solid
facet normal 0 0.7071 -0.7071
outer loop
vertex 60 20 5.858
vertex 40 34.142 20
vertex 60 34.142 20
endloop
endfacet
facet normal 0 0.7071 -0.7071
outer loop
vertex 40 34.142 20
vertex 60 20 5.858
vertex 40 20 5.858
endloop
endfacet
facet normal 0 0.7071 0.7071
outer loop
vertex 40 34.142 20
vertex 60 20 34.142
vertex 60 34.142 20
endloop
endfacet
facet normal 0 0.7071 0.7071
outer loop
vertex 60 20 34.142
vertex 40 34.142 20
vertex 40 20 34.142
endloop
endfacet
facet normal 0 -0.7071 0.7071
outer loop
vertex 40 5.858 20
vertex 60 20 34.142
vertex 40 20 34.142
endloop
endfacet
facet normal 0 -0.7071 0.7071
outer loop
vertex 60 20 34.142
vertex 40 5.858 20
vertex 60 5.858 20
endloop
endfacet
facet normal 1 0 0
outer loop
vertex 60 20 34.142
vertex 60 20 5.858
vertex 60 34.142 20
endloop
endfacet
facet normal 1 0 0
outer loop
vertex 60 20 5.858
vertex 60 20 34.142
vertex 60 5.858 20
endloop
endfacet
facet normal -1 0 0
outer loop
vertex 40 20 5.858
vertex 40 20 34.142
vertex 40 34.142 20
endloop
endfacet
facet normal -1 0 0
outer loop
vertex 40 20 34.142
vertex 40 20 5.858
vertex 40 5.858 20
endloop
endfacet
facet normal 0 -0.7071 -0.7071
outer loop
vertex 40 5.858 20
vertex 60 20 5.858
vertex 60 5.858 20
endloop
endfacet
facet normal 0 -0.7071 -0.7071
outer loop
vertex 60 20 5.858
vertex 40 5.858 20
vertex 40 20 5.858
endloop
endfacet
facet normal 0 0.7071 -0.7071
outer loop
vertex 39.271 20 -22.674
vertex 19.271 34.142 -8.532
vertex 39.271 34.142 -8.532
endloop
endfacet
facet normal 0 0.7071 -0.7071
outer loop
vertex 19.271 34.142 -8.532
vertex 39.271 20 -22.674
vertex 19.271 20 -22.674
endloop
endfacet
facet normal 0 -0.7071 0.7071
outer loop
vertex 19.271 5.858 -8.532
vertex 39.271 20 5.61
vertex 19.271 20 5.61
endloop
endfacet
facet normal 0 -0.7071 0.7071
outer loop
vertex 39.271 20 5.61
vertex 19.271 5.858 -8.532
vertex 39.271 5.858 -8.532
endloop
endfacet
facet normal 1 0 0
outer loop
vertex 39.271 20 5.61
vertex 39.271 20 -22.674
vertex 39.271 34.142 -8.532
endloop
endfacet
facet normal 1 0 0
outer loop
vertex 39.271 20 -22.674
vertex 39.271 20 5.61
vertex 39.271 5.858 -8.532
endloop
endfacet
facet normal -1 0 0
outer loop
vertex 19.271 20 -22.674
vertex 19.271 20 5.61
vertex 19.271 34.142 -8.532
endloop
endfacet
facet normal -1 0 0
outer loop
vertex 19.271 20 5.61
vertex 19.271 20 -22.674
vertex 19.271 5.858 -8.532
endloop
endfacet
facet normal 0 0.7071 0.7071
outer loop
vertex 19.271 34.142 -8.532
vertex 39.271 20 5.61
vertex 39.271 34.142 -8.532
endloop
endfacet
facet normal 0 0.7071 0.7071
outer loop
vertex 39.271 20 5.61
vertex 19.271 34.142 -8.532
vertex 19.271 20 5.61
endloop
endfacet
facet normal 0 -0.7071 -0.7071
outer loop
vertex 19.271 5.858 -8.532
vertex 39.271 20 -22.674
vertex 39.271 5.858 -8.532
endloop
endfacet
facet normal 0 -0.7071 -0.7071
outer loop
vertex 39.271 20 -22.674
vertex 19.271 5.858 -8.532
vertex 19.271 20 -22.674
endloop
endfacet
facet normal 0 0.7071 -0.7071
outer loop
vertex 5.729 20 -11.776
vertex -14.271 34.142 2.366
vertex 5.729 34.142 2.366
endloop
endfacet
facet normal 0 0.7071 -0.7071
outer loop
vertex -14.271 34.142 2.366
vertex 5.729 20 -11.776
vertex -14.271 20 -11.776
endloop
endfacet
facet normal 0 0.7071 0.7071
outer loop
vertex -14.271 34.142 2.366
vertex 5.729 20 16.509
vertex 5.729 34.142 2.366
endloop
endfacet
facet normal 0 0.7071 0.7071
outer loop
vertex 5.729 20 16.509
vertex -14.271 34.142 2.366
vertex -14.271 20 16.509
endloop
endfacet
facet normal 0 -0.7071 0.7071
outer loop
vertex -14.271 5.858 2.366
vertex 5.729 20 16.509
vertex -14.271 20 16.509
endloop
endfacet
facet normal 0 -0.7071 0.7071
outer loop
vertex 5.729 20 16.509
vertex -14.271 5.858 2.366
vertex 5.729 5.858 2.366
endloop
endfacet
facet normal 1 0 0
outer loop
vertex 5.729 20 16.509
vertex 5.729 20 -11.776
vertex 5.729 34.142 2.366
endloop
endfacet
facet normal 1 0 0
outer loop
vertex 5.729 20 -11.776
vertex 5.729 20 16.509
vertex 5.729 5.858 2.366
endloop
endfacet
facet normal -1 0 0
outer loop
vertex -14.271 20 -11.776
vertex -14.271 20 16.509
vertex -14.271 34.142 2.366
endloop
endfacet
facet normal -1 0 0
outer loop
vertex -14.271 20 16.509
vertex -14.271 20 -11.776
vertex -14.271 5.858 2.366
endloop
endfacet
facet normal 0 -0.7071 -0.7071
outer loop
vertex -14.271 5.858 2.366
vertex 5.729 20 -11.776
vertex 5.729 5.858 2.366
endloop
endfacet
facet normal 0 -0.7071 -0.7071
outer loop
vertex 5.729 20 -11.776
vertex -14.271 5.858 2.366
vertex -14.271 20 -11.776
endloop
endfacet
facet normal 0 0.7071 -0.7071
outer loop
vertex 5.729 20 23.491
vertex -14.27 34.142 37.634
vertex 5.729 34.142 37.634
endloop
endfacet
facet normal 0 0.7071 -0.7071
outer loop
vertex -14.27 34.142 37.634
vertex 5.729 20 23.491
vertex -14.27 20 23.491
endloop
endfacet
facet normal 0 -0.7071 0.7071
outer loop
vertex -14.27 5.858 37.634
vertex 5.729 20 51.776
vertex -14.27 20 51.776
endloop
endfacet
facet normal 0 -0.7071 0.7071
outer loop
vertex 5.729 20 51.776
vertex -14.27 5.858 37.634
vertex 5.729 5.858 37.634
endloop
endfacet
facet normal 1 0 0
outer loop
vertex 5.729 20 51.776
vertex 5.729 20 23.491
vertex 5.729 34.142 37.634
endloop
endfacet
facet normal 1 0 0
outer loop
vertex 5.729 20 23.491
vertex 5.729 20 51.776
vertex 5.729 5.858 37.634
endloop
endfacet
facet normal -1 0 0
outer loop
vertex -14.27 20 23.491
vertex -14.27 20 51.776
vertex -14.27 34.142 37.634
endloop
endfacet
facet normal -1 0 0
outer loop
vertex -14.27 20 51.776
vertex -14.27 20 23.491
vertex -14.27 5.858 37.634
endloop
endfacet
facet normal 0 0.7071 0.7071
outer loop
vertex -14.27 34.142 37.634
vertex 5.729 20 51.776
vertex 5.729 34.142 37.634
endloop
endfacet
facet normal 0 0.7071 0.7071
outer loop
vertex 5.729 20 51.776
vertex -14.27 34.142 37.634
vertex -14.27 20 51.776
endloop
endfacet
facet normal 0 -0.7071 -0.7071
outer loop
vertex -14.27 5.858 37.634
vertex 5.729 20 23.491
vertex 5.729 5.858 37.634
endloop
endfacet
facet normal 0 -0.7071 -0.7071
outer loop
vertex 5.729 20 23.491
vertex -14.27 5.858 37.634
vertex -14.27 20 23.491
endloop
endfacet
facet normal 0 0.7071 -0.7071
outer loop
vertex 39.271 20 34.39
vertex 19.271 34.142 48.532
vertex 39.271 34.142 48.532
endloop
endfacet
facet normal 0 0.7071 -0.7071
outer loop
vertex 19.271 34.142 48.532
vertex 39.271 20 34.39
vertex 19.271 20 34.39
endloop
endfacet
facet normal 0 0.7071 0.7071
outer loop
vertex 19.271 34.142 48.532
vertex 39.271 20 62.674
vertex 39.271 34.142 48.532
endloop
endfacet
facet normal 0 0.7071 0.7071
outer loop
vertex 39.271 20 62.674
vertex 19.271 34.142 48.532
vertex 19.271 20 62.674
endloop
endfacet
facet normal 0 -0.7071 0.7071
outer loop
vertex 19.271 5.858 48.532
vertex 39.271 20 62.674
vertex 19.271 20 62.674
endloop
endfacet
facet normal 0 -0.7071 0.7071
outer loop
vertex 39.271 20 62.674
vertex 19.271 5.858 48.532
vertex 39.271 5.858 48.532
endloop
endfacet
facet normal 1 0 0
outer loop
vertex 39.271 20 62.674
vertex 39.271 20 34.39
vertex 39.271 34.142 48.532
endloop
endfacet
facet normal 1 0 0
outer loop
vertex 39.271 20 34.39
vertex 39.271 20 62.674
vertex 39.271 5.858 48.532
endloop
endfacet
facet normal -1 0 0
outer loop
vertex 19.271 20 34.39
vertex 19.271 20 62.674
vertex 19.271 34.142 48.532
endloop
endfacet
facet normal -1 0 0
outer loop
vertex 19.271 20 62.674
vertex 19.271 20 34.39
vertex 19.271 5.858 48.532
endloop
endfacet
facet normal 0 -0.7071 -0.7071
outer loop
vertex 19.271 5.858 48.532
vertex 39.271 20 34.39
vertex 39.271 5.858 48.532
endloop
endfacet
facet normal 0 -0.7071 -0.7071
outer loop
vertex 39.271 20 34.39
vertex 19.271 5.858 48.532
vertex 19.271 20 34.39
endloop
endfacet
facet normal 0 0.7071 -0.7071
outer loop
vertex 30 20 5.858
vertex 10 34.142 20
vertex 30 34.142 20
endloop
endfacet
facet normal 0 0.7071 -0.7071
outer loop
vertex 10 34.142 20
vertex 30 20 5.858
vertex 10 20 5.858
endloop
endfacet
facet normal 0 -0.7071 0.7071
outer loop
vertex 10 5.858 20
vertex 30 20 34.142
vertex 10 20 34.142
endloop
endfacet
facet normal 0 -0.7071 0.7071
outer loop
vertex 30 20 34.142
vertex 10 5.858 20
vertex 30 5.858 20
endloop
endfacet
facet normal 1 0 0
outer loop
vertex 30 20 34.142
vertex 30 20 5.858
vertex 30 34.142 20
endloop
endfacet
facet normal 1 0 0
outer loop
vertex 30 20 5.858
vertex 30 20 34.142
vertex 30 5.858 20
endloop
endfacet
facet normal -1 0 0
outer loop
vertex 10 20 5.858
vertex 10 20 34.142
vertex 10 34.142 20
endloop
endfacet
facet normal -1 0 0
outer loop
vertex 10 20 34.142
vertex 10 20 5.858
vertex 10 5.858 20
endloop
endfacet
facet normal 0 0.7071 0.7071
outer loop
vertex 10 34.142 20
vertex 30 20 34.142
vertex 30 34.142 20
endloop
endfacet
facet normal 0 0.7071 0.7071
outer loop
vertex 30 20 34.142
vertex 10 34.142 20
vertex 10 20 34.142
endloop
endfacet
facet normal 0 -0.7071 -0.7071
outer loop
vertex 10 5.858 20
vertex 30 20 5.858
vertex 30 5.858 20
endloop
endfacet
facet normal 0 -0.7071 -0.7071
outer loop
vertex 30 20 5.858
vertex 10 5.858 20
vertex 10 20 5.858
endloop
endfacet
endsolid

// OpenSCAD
$fn=5;
union()
{
	union()
	{
		translate([40,20,5.8578644])
		{
			rotate(45.000004,[1,0,0])
			{
				cube([20,20,20]);
			}
		}
		translate([19.270512,20,-22.67383])
		{
			rotate(45.000004,[1,0,0])
			{
				cube([20,20,20]);
			}
		}
		translate([-14.270512,20,-11.775692])
		{
			rotate(45.000004,[1,0,0])
			{
				cube([20,20,20]);
			}
		}
		translate([-14.2705,20,23.491432])
		{
			rotate(45.000004,[1,0,0])
			{
				cube([20,20,20]);
			}
		}
		translate([19.270515,20,34.389557])
		{
			rotate(45.000004,[1,0,0])
			{
				cube([20,20,20]);
			}
		}
	}
	translate([10,20,5.8578644])
	{
		rotate(45.000004,[1,0,0])
		{
			cube([20,20,20]);
		}
	}
}
